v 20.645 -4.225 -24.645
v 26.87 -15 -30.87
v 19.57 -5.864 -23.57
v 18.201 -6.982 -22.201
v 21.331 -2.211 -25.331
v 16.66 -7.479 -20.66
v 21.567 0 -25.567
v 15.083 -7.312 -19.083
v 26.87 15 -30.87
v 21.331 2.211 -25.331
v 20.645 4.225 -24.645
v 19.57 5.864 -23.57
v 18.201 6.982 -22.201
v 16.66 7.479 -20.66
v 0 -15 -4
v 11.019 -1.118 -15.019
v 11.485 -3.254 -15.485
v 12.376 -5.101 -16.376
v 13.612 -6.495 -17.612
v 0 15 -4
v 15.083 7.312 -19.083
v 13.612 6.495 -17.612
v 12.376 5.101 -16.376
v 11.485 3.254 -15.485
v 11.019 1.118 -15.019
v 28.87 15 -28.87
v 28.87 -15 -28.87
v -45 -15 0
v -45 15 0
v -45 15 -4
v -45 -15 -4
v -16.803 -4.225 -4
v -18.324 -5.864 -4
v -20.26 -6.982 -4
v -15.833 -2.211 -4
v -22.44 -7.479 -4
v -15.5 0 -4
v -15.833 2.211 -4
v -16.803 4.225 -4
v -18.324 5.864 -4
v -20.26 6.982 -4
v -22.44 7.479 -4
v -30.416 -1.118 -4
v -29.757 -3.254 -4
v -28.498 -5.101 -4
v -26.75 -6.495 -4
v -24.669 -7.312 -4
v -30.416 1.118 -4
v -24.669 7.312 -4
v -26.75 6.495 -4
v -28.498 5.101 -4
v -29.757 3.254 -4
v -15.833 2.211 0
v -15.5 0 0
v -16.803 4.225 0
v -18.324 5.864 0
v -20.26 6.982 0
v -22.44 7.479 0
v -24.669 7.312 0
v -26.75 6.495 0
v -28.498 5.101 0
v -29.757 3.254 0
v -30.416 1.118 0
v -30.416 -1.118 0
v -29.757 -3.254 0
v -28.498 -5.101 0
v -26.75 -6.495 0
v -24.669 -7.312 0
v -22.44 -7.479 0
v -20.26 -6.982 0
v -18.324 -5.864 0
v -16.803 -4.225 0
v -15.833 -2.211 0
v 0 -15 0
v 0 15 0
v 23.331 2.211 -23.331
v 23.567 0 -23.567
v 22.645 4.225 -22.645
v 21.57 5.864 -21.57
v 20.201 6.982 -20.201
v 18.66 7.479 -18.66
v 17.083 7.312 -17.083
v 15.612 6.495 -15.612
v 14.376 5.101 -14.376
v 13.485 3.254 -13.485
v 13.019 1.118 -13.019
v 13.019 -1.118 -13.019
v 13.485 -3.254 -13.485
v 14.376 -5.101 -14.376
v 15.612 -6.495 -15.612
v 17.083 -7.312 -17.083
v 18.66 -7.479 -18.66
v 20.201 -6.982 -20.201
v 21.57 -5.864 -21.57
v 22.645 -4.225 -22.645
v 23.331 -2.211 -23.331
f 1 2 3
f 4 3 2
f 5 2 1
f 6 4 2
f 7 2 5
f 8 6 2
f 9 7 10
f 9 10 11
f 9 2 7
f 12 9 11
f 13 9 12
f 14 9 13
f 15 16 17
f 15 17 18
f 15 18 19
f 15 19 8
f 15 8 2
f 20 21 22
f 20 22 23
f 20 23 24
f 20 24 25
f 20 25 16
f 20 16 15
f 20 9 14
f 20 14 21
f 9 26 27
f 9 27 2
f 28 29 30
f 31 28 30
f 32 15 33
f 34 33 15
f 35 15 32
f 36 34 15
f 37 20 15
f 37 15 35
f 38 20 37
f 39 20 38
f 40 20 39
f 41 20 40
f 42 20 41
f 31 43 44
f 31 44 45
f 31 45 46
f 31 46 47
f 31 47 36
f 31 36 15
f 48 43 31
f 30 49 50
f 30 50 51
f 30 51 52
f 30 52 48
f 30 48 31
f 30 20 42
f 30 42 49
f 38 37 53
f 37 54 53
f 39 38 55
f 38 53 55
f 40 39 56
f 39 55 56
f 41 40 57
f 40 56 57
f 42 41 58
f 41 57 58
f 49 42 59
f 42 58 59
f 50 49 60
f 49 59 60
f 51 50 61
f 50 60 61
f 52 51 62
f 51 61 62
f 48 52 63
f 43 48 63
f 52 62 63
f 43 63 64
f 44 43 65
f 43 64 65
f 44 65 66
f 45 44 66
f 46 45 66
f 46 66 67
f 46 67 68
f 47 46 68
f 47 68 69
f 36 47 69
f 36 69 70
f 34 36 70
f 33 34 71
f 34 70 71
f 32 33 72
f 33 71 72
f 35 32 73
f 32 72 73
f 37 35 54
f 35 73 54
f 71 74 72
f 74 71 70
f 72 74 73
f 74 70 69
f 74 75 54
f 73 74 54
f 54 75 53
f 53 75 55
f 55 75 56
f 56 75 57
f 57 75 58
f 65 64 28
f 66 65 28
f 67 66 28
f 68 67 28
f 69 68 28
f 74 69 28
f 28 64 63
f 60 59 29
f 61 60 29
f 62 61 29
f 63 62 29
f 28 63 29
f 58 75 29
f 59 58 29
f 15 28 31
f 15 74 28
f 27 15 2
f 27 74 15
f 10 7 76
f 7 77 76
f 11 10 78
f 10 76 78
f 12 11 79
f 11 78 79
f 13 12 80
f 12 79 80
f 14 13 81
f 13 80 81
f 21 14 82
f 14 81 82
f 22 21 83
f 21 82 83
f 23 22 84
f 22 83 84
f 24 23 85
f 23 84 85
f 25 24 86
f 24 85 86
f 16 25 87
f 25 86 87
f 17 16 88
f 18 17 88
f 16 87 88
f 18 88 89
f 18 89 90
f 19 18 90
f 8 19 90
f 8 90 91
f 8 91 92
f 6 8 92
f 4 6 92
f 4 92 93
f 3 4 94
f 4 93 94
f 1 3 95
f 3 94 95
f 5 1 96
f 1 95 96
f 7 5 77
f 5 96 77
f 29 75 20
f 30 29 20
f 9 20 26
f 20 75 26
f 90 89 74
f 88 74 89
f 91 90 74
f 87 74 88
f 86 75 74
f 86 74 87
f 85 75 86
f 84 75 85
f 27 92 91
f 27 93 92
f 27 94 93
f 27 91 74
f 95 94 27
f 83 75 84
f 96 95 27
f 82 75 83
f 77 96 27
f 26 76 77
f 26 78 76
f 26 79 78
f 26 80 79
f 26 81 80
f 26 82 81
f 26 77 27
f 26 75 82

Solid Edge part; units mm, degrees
sketch "Sketch1" plane through (0, 0, 0) normal (0, -1, 0) x (1, 0, 0)
  line L0 (0, 0) -> (-45, 0)
  line L1 (-45, 0) -> (-45, -4)
  line L2 (0, -4) -> (-45, -4)
  line L3 (26.8701, -30.8701) -> (0, -4)
  line L4 (28.8701, -28.8701) -> (26.8701, -30.8701)
  line L5 (0, 0) -> (28.8701, -28.8701)
  dimension "D1" = 4
  dimension "D2" = 45
  dimension "D3" = 38
extrude "Protrusion1" add sketch "Sketch1" along normal mid plane 30
sketch "Sketch2" plane through (-15, 0, 0) normal (0, 0, 1) x (1, 0, 0)
  circle A0 centre (-8, 0) radius 7.5
  dimension "D1" = 15
  dimension "D2" = 23
extrude "Cutout1" cut sketch "Sketch2" against normal up to surface (4 mm away)
sketch "Sketch3" plane through (10.6066, 0, -10.6066) normal (0.7071068, 0, 0.7071068) x (0.7071068, 0, -0.7071068)
  circle A0 centre (10.8284, 0) radius 7.5
  dimension "D1" = 15
  dimension "D2" = 23
extrude "Cutout2" cut sketch "Sketch3" against normal up to surface (2.8284 mm away)
properties material "Stainless steel"
